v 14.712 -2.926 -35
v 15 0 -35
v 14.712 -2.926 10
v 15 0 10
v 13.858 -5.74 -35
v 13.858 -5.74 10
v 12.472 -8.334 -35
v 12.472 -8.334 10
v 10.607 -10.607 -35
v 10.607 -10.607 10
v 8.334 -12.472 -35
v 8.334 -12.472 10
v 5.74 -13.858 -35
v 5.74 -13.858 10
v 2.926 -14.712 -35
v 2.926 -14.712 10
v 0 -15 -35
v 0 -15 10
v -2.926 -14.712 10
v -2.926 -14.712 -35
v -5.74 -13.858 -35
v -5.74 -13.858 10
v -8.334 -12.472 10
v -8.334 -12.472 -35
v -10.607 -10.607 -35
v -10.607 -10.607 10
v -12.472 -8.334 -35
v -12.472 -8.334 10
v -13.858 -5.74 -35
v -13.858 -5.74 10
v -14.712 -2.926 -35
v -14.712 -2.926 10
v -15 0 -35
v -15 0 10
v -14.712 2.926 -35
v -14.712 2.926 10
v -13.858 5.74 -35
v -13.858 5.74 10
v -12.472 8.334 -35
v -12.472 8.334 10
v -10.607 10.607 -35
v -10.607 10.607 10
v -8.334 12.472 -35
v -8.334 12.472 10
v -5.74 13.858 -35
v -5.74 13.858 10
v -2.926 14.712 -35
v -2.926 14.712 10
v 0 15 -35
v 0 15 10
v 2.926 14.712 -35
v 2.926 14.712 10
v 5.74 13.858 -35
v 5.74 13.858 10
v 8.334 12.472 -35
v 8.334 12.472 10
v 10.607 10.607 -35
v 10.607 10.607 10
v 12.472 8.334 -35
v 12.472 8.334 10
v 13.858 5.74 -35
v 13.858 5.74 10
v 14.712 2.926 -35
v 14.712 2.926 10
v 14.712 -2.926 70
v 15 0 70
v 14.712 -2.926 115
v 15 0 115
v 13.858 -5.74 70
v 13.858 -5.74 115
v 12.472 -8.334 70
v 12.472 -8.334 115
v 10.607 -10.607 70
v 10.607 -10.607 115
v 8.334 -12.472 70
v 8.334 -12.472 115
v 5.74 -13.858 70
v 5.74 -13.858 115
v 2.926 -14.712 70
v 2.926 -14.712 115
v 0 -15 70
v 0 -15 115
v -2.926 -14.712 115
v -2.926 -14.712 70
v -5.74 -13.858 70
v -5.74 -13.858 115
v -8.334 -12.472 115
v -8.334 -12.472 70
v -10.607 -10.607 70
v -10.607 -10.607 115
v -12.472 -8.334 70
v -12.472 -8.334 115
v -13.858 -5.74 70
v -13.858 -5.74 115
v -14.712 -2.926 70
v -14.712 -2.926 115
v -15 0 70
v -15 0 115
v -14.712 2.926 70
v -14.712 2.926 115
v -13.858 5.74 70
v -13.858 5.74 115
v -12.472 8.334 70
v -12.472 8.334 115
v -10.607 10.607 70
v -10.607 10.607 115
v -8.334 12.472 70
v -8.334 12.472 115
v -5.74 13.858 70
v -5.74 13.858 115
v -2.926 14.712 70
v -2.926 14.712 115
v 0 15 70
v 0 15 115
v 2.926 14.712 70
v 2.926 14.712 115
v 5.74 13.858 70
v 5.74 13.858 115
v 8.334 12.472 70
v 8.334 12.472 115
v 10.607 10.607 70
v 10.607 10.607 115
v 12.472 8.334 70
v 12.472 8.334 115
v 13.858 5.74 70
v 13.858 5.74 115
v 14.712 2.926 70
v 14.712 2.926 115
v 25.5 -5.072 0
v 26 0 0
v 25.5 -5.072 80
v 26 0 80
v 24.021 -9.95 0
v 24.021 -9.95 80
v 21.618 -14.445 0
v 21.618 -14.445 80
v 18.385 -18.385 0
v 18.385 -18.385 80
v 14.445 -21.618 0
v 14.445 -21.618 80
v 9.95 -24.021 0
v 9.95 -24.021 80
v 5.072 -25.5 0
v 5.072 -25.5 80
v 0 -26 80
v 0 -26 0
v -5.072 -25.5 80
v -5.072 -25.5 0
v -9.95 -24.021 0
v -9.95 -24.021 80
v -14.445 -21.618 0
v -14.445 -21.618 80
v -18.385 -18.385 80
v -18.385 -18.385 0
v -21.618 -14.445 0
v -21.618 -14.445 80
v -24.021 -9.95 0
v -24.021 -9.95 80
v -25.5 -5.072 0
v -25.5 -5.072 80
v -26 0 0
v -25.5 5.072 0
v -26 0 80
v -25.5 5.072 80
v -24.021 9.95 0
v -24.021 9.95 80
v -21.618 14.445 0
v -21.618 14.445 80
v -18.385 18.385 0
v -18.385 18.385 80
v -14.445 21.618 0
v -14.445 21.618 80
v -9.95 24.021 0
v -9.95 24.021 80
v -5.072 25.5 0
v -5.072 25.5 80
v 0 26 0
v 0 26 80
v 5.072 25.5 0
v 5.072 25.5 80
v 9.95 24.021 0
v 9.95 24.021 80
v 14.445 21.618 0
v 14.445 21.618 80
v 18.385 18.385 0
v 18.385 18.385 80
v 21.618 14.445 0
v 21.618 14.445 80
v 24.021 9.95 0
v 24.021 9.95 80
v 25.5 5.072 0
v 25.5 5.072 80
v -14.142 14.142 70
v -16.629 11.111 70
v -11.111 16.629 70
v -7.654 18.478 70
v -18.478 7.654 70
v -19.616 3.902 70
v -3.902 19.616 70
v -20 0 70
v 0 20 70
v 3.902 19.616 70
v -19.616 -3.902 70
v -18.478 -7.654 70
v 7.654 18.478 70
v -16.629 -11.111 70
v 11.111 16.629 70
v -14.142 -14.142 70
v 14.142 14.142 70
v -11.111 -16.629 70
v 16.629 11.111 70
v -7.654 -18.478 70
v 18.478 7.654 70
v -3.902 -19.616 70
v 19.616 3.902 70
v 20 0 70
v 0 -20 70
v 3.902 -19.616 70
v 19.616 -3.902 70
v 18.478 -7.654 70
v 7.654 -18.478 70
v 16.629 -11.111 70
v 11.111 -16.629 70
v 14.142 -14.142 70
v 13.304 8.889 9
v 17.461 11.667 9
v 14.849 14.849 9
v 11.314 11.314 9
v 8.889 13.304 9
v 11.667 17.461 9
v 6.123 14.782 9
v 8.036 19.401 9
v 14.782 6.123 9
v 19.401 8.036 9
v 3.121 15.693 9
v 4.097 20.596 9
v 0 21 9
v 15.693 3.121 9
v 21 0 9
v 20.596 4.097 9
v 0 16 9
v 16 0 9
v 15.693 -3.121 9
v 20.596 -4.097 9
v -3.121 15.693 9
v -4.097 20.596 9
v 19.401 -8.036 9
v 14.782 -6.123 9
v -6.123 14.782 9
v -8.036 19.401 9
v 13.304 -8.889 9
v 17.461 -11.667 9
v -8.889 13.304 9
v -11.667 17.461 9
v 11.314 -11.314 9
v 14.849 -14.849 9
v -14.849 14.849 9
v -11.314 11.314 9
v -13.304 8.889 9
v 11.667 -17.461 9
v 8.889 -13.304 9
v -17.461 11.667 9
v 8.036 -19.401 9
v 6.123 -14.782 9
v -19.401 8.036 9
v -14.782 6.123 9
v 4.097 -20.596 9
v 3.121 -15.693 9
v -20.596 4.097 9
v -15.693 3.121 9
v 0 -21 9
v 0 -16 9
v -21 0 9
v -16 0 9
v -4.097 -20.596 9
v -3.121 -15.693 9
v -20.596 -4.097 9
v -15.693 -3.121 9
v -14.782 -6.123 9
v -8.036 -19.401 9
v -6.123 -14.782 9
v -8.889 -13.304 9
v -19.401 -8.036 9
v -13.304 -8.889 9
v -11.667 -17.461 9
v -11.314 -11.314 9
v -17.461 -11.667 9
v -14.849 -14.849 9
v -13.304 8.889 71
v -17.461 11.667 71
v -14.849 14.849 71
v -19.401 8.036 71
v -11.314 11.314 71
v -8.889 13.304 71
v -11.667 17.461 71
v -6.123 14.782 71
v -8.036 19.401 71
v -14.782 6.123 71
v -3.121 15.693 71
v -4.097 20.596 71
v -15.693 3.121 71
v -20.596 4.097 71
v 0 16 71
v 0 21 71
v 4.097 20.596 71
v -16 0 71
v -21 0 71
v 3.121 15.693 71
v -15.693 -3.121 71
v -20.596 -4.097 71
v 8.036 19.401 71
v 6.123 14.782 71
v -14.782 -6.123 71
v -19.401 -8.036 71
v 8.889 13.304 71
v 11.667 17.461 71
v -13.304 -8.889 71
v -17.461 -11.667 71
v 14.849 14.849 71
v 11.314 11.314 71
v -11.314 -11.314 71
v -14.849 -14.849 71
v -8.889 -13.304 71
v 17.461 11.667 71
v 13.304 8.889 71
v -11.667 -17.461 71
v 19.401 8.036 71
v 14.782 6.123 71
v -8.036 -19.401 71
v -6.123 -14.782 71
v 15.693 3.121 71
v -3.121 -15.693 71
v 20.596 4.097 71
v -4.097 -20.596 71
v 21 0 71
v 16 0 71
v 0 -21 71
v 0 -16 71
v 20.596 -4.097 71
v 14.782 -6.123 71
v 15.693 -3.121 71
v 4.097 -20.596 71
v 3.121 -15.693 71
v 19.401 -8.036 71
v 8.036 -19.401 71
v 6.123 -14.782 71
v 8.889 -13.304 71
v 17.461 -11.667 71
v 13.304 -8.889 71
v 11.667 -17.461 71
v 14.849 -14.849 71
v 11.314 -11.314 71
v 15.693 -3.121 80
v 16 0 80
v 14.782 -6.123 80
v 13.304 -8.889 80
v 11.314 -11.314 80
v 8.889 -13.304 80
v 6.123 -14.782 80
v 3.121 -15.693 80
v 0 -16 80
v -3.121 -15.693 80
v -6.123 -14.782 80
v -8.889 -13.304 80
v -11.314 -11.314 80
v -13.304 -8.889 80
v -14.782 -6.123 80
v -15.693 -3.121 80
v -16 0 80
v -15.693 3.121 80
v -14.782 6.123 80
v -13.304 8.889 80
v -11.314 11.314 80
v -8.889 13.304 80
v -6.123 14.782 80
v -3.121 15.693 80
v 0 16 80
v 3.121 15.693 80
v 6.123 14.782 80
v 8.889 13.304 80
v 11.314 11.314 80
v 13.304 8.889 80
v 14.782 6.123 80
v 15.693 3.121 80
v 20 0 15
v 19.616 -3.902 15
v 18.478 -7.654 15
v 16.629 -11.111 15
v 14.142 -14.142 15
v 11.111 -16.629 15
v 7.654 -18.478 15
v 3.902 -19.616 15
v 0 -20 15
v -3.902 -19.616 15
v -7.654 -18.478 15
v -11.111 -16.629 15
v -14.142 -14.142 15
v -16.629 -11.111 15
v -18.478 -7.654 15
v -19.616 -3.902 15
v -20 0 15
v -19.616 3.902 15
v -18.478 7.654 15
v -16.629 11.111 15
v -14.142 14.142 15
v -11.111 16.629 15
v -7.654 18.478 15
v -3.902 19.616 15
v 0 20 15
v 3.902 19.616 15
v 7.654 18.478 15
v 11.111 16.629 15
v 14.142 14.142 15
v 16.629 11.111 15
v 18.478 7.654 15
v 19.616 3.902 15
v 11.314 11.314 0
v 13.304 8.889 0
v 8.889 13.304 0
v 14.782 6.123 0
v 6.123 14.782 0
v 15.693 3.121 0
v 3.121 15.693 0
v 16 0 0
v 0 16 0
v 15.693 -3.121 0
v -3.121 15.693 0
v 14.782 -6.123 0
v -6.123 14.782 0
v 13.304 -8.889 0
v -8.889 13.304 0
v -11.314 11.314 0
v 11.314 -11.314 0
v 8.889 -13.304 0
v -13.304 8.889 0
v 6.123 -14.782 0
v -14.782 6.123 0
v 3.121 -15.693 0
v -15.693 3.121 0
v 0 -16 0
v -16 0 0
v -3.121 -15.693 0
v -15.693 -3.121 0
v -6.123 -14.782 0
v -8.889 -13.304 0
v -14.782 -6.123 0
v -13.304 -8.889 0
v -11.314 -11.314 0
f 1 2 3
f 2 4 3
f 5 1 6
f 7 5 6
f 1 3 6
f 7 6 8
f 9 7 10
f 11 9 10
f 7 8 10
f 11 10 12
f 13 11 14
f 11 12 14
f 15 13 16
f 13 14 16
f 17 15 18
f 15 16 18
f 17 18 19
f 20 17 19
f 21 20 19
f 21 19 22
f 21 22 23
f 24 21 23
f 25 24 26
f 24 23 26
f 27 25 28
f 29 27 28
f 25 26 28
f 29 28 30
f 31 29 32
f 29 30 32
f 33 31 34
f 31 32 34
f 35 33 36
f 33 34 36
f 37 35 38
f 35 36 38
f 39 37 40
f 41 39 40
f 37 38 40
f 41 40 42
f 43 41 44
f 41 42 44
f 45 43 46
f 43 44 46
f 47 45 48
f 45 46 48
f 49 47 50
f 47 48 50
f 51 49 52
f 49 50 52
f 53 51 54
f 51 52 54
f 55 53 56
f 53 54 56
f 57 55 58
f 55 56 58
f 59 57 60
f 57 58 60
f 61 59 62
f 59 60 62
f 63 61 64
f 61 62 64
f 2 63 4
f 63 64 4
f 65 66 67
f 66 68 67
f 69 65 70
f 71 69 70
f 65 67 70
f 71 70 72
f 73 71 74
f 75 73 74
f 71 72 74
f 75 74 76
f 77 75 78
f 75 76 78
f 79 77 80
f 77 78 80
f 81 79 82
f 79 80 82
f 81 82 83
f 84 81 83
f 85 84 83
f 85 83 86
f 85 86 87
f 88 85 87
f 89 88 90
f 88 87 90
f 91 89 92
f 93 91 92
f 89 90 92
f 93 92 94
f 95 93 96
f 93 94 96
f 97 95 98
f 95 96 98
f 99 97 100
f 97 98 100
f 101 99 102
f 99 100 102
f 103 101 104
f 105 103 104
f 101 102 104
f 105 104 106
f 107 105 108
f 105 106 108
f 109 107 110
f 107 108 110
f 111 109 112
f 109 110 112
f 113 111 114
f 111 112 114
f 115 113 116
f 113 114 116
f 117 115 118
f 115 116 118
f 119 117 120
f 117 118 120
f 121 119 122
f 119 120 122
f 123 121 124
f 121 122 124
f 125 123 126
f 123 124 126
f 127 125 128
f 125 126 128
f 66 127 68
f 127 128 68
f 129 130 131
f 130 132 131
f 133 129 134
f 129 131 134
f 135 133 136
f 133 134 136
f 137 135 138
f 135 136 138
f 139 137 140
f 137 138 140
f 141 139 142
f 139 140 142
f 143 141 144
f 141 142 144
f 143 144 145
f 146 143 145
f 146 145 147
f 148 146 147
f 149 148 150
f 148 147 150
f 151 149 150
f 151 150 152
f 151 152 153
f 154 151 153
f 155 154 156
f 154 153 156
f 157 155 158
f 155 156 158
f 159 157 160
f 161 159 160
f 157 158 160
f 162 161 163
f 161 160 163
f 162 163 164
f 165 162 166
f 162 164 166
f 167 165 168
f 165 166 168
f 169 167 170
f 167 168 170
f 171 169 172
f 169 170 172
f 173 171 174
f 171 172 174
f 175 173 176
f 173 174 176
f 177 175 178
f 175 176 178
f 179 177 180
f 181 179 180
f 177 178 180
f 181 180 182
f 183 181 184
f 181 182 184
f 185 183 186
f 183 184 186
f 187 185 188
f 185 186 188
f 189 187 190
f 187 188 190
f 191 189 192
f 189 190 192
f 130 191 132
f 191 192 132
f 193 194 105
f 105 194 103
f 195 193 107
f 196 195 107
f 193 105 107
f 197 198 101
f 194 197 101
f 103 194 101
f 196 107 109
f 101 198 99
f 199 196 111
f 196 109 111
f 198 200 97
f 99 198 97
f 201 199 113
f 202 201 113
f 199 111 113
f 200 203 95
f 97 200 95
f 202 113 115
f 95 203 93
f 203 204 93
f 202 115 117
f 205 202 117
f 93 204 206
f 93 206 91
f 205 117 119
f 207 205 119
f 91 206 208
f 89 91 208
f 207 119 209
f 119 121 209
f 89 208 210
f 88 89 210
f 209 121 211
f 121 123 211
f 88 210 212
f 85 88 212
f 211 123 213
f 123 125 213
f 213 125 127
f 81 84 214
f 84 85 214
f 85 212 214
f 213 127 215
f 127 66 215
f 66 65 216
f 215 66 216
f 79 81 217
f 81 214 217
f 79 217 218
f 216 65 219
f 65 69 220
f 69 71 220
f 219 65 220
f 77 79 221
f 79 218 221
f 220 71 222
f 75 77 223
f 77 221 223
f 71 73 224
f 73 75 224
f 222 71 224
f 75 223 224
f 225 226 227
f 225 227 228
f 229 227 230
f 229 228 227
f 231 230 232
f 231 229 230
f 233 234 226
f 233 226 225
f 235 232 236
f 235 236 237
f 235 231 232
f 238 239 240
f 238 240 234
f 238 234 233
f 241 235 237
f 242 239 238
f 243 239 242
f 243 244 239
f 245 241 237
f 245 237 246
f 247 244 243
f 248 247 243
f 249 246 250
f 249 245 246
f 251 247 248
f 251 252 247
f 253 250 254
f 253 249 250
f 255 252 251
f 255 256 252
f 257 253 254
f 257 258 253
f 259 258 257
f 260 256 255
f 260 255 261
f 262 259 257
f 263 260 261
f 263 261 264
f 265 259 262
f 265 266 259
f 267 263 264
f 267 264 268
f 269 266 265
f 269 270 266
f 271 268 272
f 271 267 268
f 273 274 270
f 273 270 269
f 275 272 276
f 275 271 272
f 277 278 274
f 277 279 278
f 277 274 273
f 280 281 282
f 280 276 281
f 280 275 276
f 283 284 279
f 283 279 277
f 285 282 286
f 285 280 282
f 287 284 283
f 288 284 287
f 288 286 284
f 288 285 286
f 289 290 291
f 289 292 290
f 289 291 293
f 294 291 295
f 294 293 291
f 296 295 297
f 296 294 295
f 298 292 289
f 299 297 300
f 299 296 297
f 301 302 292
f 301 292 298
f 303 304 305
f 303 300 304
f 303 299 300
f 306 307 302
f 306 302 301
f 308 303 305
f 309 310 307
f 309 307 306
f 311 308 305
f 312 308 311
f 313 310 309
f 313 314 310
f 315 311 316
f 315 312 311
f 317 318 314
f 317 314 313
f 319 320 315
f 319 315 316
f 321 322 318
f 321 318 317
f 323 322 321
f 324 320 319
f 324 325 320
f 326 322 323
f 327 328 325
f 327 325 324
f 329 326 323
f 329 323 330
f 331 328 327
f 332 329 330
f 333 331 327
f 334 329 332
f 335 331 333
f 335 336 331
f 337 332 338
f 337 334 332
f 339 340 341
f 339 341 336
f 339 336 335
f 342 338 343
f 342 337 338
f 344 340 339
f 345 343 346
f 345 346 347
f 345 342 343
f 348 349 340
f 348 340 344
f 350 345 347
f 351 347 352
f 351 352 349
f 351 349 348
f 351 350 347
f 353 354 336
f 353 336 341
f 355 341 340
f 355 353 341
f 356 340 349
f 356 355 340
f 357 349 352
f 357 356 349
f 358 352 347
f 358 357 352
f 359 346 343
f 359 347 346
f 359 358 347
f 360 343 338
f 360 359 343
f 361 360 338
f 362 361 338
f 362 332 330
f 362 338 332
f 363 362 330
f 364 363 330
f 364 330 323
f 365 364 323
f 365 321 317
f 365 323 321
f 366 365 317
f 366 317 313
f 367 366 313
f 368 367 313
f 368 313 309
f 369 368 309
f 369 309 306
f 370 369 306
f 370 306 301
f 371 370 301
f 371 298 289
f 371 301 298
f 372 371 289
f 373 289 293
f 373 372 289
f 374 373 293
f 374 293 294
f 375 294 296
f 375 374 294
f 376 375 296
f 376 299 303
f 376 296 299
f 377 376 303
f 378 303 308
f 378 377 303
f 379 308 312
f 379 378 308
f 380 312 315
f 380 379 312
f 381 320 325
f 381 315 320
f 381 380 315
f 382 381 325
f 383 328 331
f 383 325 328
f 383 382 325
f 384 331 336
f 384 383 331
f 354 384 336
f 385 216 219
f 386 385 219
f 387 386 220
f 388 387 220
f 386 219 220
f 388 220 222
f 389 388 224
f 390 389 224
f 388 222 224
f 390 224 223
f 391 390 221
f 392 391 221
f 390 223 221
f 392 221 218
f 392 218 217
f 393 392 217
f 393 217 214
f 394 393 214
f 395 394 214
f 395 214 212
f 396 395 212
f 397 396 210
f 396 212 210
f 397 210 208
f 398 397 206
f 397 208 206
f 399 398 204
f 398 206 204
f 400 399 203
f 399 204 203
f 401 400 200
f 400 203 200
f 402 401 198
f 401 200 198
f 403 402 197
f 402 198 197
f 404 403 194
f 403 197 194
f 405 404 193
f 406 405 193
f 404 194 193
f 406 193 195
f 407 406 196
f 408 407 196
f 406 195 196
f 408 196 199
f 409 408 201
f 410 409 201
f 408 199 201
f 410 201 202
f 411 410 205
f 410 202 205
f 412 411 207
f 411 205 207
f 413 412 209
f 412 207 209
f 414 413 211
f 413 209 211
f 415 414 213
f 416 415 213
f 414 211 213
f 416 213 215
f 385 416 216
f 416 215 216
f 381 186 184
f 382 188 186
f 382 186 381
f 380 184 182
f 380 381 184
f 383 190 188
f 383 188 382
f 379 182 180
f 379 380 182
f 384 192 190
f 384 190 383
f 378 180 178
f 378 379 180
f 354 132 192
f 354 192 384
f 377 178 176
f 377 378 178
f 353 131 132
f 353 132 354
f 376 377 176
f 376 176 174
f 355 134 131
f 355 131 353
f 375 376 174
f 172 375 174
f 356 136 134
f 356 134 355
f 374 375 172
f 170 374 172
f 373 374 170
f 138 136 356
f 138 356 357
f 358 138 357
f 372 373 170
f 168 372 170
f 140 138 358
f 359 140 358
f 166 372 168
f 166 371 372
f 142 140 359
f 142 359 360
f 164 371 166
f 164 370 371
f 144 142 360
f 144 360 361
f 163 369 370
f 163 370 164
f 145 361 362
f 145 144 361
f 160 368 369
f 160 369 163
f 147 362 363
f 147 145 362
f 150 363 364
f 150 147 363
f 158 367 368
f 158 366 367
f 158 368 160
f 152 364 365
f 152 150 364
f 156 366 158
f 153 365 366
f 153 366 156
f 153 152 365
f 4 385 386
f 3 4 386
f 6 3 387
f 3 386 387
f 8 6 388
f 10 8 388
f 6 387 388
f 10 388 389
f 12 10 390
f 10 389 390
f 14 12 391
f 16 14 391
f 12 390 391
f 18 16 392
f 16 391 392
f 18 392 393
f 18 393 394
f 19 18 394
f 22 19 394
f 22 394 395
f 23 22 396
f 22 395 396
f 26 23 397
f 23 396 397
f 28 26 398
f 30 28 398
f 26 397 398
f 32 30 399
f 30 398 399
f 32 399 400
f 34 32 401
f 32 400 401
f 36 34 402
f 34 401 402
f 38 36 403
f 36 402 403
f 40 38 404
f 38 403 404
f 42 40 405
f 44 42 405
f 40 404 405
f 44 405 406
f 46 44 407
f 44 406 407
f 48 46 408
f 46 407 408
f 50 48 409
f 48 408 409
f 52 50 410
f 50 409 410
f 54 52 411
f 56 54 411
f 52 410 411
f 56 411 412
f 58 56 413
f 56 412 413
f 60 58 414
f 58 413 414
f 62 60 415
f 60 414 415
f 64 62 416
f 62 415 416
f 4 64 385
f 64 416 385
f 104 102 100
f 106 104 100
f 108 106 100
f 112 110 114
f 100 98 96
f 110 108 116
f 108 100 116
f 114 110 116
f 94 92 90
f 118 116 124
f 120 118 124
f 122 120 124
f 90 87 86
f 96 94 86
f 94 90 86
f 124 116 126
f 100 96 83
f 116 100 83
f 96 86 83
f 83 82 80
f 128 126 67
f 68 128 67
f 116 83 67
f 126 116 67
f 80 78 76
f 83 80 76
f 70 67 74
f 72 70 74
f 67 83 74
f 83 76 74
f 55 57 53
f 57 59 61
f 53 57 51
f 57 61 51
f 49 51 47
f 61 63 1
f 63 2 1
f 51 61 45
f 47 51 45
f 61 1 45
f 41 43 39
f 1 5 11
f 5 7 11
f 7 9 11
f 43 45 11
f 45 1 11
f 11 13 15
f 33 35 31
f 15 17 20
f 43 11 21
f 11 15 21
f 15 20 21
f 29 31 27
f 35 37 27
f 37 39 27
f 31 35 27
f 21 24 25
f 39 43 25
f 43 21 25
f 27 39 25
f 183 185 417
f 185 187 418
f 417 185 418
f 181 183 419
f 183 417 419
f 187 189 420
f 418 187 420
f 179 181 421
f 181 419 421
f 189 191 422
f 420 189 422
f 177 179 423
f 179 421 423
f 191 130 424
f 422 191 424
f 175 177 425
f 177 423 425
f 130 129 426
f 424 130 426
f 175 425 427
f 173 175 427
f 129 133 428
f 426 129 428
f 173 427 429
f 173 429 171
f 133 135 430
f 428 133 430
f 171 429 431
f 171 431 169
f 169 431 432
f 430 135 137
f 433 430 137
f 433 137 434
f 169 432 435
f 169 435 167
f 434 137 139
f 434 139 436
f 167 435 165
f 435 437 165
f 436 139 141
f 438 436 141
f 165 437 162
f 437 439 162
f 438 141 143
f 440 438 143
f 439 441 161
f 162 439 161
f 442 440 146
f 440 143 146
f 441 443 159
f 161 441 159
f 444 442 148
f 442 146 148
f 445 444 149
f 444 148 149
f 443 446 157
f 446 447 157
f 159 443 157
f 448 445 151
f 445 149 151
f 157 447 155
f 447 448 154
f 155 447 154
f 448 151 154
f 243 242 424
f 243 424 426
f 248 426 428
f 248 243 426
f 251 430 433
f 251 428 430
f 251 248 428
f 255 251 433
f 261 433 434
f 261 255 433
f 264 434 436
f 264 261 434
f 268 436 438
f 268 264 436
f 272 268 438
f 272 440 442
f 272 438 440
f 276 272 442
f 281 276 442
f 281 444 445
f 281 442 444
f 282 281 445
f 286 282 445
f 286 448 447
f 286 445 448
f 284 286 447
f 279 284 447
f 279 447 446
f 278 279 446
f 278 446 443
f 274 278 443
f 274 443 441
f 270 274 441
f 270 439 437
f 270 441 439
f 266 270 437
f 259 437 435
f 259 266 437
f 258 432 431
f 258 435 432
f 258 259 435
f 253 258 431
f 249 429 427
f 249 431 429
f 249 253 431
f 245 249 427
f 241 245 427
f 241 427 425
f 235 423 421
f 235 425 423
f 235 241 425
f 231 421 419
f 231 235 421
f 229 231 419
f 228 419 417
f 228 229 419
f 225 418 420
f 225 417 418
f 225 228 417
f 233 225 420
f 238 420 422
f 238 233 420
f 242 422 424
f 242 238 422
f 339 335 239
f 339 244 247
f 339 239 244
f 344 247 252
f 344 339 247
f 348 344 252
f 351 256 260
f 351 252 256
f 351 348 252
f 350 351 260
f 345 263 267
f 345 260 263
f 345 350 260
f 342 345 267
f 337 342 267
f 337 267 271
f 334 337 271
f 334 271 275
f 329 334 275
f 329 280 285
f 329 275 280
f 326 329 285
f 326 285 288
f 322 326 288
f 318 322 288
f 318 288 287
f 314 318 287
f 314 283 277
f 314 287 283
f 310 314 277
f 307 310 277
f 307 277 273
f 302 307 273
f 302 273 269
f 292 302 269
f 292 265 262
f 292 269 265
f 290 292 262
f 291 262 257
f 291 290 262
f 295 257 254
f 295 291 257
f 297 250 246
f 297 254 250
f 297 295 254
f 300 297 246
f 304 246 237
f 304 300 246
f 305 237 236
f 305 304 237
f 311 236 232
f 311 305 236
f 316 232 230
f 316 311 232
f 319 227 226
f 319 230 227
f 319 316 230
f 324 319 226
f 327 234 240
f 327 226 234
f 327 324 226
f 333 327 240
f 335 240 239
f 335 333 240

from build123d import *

# Parameters (mm, degrees)
F0_W      = 26
F0_H      = 80
F1_W      = 15
F1_H      = 35
F4_OFFSET = 1
F5_SIZE   = 4.99999
F7_DEPTH  = 25


# Not quite as in the source:
# - a fillet or chamfer is up to 0.001 mm smaller than in the source, because OpenCascade refuses the exact size
# - a feature of the source that left no trace in its solid (it failed there, or was rolled back) is left out


with BuildPart() as f2:
    # F0 (on Front) → F2 (revolve)
    with BuildSketch(Plane.XZ):
        with Locations((13, 40)):
            Rectangle(F0_W, F0_H)
    revolve(axis=Axis((0, 0, 40), (0, 0, -1)))


with BuildPart() as f3:
    # F1 (on Front) → F3 (revolve)
    with BuildSketch(Plane.XZ):
        Polygon((0, 115), (0, 0), (15, 0), (15, 10), (20, 10), (20, 70), (15, 70), (15, 115), align=None)
        with Locations((7.5, -17.5)):
            Rectangle(F1_W, F1_H)
    revolve(axis=Axis((0, 0, 40), (0, 0, -1)))


with BuildPart() as f2_1:
    add(f2.part)

    # F4: cut F3, made larger all round first
    f4_tool = offset(f3.part, amount=F4_OFFSET, kind=Kind.INTERSECTION, mode=Mode.PRIVATE)
    add(f4_tool, mode=Mode.SUBTRACT)


with BuildPart() as f3_1:
    add(f3.part)

    # F5 (size 5 in the source; OpenCascade refuses exactly that, so slightly less here)
    f5_edges = [f3_1.edges().sort_by_distance(p)[0] for p in [
        (-20, 0, 10),
    ]]
    chamfer(f5_edges, length=F5_SIZE)


with BuildPart() as f7:
    # F6 (on face) → F7 (new body)
    with BuildSketch(Plane.XY.offset(115)):
        with BuildLine():
            ThreePointArc((15, 0), (0, -15), (-15, 0))
            Line((-15, 0), (-28.4320339561, 0))
            Line((-28.4320339561, 0), (-35, -125.1360130745))
            Line((-35, -125.1360130745), (-35, -130))
            Line((-35, -130), (-10, -130))
            Line((-10, -130), (-10, -120))
            Line((-10, -120), (10, -120))
            Line((10, -120), (10, -130))
            Line((10, -130), (35, -130))
            Line((35, -130), (35, -125.1360130745))
            Line((35, -125.1360130745), (28.4320339561, 0))
            Line((28.4320339561, 0), (15, 0))
        make_face()
        with BuildLine():
            Line((15, 0), (0, 0))
            Line((0, 0), (-15, 0))
            ThreePointArc((-15, 0), (0, -15), (15, 0))
        make_face()
    extrude(amount=-F7_DEPTH)


solid = Compound([f2_1.part, f3_1.part])
